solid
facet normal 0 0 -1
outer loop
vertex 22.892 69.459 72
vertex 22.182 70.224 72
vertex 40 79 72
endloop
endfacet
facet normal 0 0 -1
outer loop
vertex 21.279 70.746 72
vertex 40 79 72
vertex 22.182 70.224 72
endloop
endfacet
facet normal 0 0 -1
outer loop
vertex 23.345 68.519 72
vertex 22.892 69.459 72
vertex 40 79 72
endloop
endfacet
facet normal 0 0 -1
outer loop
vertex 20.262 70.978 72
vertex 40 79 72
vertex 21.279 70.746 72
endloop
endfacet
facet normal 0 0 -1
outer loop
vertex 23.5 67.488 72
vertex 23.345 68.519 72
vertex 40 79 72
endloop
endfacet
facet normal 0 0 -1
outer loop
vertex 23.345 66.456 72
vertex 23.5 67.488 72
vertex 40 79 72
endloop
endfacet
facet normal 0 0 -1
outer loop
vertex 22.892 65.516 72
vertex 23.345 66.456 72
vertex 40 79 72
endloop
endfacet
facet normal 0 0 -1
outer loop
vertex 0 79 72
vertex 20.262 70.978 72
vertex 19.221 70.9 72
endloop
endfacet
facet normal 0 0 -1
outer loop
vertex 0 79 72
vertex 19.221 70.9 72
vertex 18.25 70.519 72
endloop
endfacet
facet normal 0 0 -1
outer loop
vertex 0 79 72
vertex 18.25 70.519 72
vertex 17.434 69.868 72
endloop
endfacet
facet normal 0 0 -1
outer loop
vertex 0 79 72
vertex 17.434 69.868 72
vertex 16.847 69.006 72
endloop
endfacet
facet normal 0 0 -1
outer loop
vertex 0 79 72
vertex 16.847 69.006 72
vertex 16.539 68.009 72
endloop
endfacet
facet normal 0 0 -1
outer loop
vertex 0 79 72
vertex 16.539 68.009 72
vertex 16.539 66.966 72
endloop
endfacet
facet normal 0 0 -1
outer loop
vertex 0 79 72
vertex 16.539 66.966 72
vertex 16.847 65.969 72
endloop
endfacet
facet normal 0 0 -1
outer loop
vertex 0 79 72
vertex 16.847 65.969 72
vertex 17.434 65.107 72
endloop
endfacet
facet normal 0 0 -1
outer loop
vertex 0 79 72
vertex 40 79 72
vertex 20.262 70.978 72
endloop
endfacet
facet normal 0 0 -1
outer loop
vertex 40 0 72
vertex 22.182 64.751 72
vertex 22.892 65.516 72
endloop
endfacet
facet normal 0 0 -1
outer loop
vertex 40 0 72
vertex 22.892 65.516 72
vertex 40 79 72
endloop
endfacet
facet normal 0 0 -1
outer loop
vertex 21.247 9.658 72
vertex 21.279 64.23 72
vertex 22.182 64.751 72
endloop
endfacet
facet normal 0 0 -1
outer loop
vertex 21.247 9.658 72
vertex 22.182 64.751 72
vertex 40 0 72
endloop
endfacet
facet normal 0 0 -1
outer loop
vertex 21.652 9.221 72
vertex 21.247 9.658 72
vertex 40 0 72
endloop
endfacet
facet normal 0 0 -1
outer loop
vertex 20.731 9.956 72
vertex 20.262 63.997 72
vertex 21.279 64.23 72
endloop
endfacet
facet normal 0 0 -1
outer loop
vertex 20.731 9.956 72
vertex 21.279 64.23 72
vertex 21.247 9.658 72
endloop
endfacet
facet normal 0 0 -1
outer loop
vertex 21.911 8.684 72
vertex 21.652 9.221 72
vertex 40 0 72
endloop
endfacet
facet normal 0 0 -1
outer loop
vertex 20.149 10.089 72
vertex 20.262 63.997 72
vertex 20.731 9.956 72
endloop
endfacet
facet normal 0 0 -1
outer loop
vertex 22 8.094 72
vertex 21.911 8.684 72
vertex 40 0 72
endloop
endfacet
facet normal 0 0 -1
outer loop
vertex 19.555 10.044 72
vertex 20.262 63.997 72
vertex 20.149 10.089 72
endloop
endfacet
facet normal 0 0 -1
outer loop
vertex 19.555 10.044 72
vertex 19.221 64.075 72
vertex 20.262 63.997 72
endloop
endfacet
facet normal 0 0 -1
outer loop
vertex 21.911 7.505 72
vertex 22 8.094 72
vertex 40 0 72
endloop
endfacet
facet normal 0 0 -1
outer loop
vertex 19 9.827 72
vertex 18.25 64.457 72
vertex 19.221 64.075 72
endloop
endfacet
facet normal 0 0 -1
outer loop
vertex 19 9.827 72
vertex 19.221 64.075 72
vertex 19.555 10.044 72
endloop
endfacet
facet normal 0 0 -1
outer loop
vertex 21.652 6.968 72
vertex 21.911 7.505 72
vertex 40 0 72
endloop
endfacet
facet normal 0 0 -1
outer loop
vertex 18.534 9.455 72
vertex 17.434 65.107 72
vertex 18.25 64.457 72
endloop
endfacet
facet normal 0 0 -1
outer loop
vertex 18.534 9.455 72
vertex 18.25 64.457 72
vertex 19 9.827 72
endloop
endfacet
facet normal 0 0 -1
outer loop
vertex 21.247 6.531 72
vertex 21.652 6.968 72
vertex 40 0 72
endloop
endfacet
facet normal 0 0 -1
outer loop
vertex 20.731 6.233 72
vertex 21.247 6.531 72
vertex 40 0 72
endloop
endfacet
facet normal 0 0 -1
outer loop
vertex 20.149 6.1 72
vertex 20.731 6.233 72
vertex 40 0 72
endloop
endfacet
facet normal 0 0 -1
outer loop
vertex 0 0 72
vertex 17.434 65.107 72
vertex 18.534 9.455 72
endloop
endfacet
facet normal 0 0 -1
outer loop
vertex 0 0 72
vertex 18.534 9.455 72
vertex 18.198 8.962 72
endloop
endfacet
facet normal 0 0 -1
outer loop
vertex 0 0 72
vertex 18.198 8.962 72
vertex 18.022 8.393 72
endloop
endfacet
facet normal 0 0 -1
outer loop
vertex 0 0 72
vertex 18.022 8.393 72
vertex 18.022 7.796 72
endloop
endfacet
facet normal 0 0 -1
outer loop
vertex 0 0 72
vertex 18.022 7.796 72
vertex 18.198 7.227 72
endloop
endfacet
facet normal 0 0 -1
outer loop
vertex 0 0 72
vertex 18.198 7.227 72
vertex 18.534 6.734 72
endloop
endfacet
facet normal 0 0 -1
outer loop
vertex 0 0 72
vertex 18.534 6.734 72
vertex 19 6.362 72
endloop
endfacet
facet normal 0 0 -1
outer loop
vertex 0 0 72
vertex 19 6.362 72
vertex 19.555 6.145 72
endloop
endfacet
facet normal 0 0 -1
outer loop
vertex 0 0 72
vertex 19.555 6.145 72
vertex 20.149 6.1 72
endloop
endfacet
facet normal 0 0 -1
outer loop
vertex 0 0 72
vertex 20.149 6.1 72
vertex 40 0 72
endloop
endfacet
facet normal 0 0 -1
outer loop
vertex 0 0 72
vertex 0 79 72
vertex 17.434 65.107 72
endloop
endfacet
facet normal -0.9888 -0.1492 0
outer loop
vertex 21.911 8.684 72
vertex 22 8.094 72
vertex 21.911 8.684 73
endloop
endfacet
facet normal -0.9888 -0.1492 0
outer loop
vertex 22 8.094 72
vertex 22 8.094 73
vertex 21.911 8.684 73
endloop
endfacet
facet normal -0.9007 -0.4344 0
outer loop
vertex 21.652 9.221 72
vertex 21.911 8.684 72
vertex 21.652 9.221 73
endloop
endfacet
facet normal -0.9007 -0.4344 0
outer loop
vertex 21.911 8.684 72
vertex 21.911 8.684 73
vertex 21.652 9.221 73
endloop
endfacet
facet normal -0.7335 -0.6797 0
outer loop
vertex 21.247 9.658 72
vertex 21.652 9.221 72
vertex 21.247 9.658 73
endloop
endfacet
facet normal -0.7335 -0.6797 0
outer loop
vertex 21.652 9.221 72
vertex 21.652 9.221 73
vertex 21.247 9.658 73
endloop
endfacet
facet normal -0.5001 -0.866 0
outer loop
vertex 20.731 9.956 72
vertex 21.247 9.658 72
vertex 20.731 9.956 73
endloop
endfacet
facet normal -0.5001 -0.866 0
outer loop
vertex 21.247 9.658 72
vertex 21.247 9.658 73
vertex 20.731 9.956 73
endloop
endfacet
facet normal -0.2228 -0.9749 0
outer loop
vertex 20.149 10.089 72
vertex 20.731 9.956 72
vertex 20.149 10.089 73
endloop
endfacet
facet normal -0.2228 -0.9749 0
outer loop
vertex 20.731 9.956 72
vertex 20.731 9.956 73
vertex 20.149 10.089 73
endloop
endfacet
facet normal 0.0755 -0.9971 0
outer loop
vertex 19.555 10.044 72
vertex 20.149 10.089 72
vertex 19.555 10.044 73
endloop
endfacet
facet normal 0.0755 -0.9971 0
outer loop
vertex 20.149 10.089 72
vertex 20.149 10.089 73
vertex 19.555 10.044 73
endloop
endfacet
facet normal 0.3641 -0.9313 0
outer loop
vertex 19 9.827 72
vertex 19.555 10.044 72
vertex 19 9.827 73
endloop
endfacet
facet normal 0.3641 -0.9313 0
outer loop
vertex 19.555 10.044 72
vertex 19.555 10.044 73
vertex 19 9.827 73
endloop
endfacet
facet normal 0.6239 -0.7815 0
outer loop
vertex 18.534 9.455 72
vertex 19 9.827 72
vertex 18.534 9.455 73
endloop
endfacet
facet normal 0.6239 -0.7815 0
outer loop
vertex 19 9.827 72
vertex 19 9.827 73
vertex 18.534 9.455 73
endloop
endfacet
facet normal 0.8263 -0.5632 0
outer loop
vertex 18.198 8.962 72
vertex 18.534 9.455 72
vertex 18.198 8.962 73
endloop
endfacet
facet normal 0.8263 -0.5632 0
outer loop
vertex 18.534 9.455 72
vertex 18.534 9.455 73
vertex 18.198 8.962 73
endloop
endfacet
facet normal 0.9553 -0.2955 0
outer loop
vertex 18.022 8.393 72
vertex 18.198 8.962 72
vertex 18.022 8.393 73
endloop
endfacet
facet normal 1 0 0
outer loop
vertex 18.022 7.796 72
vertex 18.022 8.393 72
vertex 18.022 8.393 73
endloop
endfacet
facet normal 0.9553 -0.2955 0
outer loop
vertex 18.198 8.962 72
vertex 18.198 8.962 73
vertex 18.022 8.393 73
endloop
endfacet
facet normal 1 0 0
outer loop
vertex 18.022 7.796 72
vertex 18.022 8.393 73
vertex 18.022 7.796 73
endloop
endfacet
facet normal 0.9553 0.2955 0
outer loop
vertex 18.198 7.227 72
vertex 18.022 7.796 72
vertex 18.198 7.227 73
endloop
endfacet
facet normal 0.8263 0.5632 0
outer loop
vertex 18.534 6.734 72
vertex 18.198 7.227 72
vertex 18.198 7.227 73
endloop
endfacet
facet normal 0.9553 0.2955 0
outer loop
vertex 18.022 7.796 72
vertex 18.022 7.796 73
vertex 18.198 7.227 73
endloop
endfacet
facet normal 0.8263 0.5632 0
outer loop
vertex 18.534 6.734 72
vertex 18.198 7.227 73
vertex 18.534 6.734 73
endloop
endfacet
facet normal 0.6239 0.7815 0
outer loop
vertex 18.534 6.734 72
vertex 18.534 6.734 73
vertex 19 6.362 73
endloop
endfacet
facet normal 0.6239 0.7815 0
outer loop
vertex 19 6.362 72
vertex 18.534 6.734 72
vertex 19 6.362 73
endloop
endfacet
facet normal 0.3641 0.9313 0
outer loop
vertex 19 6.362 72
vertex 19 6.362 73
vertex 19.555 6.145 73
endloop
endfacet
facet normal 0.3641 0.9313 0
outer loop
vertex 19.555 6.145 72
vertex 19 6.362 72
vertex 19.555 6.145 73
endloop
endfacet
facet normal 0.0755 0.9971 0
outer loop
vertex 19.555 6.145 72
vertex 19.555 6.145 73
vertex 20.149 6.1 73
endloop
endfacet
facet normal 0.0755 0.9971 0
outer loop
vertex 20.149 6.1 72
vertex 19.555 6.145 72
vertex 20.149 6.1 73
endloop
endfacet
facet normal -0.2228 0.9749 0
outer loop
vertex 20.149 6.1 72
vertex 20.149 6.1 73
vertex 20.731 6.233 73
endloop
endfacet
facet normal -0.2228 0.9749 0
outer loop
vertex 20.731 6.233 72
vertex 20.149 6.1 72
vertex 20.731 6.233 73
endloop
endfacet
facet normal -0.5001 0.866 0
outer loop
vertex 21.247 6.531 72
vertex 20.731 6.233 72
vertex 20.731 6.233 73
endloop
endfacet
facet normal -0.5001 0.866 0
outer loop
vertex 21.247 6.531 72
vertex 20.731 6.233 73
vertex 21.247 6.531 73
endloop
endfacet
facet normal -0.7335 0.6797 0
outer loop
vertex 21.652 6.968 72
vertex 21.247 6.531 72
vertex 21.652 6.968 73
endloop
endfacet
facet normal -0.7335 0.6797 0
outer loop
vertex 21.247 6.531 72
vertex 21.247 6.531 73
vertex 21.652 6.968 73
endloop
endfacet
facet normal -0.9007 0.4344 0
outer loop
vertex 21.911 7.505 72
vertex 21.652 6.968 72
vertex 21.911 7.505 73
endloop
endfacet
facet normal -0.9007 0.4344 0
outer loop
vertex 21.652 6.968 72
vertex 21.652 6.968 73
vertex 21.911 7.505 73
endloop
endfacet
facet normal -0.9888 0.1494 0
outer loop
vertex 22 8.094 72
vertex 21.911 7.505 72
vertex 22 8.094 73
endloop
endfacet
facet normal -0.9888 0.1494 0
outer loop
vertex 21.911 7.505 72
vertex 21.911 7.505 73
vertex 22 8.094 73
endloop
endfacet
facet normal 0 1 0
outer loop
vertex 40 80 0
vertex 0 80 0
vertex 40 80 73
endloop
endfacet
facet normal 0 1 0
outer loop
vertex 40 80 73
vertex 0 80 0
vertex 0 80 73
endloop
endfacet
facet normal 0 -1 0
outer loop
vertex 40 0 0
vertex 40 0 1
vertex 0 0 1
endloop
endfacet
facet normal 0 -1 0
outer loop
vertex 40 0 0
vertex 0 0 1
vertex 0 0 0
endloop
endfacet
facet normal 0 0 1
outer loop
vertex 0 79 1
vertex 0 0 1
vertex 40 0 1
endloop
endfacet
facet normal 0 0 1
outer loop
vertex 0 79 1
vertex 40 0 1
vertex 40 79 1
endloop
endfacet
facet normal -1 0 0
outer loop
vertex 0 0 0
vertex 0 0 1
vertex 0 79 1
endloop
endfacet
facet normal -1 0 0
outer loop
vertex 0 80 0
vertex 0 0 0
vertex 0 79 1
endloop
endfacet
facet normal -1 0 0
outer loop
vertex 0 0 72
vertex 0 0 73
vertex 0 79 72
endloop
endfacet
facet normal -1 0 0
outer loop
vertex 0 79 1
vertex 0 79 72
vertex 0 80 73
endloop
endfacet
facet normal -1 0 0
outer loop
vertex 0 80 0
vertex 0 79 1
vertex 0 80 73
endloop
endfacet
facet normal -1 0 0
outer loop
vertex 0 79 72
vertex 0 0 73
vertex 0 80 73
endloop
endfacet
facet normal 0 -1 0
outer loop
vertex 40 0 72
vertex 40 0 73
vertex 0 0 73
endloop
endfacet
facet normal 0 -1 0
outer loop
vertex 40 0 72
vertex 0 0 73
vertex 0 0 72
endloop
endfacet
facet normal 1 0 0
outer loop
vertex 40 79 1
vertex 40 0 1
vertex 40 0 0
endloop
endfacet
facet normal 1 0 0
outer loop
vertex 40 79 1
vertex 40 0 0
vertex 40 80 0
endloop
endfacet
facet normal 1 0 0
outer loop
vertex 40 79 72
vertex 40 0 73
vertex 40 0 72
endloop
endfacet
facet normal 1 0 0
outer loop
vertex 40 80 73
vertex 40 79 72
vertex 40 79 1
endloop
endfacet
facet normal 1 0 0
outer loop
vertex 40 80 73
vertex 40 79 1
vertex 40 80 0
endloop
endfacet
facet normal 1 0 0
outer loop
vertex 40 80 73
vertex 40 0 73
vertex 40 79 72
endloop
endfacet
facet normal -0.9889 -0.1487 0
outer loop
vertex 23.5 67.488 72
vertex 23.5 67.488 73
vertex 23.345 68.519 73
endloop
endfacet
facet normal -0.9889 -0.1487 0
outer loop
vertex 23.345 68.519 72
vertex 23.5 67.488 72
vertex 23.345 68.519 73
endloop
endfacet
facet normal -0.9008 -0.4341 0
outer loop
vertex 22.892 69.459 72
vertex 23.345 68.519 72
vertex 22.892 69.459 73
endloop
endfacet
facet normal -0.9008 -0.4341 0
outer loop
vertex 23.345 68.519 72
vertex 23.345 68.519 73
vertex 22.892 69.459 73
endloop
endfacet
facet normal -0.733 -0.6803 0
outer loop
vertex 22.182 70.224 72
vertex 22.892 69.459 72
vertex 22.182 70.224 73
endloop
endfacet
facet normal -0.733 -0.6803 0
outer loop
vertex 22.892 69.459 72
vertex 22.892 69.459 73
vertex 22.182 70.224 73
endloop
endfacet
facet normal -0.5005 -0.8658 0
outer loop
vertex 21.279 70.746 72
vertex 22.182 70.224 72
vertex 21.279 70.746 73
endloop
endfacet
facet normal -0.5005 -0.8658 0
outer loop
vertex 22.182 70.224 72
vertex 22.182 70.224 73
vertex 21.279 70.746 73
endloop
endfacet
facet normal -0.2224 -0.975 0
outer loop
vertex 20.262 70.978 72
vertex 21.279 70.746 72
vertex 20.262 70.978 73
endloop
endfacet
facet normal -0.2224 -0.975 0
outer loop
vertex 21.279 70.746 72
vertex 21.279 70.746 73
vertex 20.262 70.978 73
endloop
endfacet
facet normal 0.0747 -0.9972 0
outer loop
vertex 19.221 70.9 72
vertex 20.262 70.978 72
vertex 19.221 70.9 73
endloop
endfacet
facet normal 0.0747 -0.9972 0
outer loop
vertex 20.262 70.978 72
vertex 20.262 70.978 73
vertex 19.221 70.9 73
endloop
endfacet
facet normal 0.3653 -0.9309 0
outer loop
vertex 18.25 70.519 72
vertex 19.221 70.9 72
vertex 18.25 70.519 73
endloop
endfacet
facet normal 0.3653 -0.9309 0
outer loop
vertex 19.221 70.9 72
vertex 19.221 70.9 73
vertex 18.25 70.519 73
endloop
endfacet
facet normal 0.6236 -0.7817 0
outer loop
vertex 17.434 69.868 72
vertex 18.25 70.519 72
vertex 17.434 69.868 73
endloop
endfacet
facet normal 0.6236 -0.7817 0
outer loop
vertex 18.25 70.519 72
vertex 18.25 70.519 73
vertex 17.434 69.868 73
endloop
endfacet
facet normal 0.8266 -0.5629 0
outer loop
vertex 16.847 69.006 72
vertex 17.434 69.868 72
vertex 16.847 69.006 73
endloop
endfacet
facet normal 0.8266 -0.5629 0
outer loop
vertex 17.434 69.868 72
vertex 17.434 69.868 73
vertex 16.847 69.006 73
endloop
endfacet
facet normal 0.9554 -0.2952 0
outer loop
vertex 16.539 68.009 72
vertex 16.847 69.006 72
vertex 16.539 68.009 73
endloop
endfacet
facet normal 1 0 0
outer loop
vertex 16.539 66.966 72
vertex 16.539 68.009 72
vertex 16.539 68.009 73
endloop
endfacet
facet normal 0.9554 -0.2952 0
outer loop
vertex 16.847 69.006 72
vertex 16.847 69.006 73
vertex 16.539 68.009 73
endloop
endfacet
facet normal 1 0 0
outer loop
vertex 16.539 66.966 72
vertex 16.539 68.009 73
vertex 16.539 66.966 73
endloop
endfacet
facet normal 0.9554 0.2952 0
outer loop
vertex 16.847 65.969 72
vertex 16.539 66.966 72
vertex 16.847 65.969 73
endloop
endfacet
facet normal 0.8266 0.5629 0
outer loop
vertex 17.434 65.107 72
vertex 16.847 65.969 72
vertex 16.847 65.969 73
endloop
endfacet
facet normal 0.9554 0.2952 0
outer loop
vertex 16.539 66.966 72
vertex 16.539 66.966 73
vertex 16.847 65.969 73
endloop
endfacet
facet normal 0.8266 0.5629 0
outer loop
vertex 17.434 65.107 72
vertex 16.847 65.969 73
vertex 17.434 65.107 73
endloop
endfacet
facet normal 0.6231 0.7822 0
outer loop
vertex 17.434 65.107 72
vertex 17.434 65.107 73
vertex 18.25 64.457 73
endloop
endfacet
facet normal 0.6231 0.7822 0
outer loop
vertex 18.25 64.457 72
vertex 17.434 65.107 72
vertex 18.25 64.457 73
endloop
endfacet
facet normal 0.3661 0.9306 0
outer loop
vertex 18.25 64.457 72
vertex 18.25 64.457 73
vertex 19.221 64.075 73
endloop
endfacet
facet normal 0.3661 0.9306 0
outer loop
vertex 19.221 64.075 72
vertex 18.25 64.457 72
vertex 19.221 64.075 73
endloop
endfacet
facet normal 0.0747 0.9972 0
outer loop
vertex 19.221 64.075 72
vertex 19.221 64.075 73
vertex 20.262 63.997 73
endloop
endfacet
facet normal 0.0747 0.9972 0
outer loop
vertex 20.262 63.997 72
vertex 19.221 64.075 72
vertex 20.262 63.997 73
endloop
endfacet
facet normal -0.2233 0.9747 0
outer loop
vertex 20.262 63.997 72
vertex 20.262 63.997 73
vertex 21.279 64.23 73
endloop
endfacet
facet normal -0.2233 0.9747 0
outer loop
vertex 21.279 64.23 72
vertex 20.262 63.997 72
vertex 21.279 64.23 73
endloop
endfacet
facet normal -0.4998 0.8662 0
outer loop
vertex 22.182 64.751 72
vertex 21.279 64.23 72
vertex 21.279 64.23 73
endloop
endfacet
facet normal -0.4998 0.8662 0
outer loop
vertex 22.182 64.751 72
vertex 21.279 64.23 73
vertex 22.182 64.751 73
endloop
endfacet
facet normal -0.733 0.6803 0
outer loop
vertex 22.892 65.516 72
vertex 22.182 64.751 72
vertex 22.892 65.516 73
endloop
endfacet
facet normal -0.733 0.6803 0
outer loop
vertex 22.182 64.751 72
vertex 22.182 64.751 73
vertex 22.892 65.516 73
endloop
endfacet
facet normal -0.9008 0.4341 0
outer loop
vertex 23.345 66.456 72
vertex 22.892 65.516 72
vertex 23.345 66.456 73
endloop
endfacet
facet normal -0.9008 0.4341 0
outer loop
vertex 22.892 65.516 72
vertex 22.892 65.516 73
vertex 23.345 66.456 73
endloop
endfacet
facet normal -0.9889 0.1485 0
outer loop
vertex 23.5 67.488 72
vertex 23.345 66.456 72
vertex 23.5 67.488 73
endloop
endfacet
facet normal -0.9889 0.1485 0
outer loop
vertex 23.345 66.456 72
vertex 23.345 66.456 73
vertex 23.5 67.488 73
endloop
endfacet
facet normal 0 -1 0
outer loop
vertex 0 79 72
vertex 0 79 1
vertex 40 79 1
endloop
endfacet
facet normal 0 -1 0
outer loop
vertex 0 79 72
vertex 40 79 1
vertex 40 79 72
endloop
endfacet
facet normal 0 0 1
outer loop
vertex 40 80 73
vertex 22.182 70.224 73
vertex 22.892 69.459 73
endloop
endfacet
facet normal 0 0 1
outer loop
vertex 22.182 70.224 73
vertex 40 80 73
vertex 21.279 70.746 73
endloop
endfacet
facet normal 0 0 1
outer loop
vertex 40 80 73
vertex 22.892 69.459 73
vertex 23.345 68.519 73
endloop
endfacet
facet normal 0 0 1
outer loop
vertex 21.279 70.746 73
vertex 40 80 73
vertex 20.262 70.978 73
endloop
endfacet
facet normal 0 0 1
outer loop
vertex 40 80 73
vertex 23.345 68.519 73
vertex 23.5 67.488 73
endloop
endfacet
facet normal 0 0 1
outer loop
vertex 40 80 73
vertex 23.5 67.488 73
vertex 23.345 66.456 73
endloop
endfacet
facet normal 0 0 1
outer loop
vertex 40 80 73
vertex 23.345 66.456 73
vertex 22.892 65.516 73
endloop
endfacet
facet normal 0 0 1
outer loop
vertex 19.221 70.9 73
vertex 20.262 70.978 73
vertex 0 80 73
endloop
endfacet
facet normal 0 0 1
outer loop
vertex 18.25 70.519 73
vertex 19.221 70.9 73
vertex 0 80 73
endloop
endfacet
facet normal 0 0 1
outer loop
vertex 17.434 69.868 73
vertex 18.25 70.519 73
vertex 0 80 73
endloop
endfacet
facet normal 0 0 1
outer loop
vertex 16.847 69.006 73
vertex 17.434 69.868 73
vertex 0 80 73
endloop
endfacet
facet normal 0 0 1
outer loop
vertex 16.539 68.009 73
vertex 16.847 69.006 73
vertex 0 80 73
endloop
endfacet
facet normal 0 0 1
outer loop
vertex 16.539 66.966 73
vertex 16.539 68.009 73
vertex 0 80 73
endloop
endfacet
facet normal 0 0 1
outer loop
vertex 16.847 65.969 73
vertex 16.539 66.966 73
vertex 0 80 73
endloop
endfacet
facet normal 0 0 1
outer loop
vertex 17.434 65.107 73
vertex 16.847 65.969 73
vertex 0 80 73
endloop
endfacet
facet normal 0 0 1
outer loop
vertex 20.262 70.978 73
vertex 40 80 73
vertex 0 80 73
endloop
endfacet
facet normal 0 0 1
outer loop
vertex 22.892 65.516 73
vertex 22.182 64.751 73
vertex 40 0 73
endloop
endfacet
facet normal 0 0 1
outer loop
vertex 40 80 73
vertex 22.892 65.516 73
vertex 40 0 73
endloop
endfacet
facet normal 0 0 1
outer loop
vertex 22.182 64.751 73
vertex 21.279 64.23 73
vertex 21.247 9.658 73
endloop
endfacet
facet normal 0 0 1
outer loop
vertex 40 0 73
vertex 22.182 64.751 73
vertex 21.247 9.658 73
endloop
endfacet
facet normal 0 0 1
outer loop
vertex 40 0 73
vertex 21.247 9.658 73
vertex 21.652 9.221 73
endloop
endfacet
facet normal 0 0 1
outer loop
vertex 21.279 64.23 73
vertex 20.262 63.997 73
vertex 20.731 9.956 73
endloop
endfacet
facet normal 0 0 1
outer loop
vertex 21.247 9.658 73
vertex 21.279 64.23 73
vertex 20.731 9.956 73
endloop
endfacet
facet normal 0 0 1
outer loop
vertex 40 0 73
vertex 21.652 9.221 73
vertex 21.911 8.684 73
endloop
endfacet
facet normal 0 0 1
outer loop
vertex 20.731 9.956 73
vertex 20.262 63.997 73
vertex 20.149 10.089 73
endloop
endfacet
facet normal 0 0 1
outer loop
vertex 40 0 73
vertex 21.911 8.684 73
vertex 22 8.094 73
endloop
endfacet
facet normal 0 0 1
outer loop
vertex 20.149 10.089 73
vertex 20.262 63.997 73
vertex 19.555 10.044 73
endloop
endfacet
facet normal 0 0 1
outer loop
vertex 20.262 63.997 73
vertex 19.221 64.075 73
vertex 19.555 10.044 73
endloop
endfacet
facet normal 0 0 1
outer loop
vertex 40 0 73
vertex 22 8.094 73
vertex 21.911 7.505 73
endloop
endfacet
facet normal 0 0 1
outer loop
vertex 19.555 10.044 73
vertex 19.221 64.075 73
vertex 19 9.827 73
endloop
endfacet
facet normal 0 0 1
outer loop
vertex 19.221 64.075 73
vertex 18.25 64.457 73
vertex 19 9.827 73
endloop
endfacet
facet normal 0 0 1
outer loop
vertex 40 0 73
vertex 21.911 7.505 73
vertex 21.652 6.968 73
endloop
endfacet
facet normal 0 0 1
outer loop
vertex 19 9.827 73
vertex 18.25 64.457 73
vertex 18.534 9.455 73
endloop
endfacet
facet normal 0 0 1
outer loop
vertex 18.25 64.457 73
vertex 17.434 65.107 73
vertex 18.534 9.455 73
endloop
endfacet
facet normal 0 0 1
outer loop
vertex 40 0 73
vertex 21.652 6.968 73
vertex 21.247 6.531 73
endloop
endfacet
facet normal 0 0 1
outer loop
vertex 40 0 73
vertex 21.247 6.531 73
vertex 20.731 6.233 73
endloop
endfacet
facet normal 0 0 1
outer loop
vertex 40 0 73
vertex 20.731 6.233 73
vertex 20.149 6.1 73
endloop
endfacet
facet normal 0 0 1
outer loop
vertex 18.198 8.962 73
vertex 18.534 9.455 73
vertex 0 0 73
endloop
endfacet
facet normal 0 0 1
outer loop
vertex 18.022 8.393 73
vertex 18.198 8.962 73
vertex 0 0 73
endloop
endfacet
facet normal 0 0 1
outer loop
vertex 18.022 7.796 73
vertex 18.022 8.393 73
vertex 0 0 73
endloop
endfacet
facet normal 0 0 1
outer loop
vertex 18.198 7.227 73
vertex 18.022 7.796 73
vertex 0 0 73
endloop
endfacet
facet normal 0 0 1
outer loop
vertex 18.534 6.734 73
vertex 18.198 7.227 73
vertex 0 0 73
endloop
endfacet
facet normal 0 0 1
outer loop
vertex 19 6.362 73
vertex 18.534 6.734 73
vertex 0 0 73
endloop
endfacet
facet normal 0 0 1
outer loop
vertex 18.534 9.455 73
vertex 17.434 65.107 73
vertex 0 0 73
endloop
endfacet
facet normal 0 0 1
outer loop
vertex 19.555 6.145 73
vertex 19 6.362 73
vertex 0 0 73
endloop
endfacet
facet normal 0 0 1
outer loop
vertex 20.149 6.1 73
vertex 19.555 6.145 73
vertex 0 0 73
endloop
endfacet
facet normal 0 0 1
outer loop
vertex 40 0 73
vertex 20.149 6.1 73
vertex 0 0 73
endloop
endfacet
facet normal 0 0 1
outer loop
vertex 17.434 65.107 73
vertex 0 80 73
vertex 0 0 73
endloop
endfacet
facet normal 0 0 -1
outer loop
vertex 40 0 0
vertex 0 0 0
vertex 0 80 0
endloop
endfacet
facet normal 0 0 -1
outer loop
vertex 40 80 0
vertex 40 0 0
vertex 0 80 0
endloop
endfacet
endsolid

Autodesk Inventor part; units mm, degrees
ref_plane "YZ Plane" through (0, 0, 0) normal (1, 0, 0) x (0, 1, 0)
ref_plane "XZ Plane" through (0, 0, 0) normal (0, 1, 0) x (-1, 0, 0)
ref_plane "XY Plane" through (0, 0, 0) normal (0, 0, 1) x (1, 0, 0)
sketch "Sketch3" plane through (0, 0, 0) normal (1, 0, 0) x (0, 1, 0)
  line L0 (0, 0) -> (80, 0)
  line L1 (80, 0) -> (80, 73)
  line L2 (80, 73) -> (0, 73)
  line L3 (0, 73) -> (0, 0)
  dimension "d8" = 80
  dimension "d9" = 73
extrude "Extrusion3" add sketch "Sketch3" along normal blind 40
shell "Shell1" thickness 1 removed faces 3 at (26.6667, 0, 48.6667) at (0, 53.3333, 24.3333) at (40, 53.3333, 24.3333)
sketch "Sketch4" plane through (0, 0, 73) normal (0, 0, 1) x (1, 0, 0)
  line L0 (0, 0) -> (40, 0) projected
  line L1 (0, 80) -> (40, 80) projected
  circle A0 centre (20, 8.0945) radius 2
  dimension "d13" = 4
extrude "Extrusion4" cut sketch "Sketch4" against normal blind 1
sketch "Sketch5" plane through (0, 0, 73) normal (0, 0, 1) x (1, 0, 0)
  line L0 (0, 80) -> (40, 80) projected
  circle A0 centre (20, 67.4876) radius 3.5
  point P0 (0, 0)
  dimension "d16" = 7
extrude "Extrusion5" cut sketch "Sketch5" against normal blind 1
properties part number "MAN_BASIS_THIRD_STRUCTURE" material "ABS Plastic"
